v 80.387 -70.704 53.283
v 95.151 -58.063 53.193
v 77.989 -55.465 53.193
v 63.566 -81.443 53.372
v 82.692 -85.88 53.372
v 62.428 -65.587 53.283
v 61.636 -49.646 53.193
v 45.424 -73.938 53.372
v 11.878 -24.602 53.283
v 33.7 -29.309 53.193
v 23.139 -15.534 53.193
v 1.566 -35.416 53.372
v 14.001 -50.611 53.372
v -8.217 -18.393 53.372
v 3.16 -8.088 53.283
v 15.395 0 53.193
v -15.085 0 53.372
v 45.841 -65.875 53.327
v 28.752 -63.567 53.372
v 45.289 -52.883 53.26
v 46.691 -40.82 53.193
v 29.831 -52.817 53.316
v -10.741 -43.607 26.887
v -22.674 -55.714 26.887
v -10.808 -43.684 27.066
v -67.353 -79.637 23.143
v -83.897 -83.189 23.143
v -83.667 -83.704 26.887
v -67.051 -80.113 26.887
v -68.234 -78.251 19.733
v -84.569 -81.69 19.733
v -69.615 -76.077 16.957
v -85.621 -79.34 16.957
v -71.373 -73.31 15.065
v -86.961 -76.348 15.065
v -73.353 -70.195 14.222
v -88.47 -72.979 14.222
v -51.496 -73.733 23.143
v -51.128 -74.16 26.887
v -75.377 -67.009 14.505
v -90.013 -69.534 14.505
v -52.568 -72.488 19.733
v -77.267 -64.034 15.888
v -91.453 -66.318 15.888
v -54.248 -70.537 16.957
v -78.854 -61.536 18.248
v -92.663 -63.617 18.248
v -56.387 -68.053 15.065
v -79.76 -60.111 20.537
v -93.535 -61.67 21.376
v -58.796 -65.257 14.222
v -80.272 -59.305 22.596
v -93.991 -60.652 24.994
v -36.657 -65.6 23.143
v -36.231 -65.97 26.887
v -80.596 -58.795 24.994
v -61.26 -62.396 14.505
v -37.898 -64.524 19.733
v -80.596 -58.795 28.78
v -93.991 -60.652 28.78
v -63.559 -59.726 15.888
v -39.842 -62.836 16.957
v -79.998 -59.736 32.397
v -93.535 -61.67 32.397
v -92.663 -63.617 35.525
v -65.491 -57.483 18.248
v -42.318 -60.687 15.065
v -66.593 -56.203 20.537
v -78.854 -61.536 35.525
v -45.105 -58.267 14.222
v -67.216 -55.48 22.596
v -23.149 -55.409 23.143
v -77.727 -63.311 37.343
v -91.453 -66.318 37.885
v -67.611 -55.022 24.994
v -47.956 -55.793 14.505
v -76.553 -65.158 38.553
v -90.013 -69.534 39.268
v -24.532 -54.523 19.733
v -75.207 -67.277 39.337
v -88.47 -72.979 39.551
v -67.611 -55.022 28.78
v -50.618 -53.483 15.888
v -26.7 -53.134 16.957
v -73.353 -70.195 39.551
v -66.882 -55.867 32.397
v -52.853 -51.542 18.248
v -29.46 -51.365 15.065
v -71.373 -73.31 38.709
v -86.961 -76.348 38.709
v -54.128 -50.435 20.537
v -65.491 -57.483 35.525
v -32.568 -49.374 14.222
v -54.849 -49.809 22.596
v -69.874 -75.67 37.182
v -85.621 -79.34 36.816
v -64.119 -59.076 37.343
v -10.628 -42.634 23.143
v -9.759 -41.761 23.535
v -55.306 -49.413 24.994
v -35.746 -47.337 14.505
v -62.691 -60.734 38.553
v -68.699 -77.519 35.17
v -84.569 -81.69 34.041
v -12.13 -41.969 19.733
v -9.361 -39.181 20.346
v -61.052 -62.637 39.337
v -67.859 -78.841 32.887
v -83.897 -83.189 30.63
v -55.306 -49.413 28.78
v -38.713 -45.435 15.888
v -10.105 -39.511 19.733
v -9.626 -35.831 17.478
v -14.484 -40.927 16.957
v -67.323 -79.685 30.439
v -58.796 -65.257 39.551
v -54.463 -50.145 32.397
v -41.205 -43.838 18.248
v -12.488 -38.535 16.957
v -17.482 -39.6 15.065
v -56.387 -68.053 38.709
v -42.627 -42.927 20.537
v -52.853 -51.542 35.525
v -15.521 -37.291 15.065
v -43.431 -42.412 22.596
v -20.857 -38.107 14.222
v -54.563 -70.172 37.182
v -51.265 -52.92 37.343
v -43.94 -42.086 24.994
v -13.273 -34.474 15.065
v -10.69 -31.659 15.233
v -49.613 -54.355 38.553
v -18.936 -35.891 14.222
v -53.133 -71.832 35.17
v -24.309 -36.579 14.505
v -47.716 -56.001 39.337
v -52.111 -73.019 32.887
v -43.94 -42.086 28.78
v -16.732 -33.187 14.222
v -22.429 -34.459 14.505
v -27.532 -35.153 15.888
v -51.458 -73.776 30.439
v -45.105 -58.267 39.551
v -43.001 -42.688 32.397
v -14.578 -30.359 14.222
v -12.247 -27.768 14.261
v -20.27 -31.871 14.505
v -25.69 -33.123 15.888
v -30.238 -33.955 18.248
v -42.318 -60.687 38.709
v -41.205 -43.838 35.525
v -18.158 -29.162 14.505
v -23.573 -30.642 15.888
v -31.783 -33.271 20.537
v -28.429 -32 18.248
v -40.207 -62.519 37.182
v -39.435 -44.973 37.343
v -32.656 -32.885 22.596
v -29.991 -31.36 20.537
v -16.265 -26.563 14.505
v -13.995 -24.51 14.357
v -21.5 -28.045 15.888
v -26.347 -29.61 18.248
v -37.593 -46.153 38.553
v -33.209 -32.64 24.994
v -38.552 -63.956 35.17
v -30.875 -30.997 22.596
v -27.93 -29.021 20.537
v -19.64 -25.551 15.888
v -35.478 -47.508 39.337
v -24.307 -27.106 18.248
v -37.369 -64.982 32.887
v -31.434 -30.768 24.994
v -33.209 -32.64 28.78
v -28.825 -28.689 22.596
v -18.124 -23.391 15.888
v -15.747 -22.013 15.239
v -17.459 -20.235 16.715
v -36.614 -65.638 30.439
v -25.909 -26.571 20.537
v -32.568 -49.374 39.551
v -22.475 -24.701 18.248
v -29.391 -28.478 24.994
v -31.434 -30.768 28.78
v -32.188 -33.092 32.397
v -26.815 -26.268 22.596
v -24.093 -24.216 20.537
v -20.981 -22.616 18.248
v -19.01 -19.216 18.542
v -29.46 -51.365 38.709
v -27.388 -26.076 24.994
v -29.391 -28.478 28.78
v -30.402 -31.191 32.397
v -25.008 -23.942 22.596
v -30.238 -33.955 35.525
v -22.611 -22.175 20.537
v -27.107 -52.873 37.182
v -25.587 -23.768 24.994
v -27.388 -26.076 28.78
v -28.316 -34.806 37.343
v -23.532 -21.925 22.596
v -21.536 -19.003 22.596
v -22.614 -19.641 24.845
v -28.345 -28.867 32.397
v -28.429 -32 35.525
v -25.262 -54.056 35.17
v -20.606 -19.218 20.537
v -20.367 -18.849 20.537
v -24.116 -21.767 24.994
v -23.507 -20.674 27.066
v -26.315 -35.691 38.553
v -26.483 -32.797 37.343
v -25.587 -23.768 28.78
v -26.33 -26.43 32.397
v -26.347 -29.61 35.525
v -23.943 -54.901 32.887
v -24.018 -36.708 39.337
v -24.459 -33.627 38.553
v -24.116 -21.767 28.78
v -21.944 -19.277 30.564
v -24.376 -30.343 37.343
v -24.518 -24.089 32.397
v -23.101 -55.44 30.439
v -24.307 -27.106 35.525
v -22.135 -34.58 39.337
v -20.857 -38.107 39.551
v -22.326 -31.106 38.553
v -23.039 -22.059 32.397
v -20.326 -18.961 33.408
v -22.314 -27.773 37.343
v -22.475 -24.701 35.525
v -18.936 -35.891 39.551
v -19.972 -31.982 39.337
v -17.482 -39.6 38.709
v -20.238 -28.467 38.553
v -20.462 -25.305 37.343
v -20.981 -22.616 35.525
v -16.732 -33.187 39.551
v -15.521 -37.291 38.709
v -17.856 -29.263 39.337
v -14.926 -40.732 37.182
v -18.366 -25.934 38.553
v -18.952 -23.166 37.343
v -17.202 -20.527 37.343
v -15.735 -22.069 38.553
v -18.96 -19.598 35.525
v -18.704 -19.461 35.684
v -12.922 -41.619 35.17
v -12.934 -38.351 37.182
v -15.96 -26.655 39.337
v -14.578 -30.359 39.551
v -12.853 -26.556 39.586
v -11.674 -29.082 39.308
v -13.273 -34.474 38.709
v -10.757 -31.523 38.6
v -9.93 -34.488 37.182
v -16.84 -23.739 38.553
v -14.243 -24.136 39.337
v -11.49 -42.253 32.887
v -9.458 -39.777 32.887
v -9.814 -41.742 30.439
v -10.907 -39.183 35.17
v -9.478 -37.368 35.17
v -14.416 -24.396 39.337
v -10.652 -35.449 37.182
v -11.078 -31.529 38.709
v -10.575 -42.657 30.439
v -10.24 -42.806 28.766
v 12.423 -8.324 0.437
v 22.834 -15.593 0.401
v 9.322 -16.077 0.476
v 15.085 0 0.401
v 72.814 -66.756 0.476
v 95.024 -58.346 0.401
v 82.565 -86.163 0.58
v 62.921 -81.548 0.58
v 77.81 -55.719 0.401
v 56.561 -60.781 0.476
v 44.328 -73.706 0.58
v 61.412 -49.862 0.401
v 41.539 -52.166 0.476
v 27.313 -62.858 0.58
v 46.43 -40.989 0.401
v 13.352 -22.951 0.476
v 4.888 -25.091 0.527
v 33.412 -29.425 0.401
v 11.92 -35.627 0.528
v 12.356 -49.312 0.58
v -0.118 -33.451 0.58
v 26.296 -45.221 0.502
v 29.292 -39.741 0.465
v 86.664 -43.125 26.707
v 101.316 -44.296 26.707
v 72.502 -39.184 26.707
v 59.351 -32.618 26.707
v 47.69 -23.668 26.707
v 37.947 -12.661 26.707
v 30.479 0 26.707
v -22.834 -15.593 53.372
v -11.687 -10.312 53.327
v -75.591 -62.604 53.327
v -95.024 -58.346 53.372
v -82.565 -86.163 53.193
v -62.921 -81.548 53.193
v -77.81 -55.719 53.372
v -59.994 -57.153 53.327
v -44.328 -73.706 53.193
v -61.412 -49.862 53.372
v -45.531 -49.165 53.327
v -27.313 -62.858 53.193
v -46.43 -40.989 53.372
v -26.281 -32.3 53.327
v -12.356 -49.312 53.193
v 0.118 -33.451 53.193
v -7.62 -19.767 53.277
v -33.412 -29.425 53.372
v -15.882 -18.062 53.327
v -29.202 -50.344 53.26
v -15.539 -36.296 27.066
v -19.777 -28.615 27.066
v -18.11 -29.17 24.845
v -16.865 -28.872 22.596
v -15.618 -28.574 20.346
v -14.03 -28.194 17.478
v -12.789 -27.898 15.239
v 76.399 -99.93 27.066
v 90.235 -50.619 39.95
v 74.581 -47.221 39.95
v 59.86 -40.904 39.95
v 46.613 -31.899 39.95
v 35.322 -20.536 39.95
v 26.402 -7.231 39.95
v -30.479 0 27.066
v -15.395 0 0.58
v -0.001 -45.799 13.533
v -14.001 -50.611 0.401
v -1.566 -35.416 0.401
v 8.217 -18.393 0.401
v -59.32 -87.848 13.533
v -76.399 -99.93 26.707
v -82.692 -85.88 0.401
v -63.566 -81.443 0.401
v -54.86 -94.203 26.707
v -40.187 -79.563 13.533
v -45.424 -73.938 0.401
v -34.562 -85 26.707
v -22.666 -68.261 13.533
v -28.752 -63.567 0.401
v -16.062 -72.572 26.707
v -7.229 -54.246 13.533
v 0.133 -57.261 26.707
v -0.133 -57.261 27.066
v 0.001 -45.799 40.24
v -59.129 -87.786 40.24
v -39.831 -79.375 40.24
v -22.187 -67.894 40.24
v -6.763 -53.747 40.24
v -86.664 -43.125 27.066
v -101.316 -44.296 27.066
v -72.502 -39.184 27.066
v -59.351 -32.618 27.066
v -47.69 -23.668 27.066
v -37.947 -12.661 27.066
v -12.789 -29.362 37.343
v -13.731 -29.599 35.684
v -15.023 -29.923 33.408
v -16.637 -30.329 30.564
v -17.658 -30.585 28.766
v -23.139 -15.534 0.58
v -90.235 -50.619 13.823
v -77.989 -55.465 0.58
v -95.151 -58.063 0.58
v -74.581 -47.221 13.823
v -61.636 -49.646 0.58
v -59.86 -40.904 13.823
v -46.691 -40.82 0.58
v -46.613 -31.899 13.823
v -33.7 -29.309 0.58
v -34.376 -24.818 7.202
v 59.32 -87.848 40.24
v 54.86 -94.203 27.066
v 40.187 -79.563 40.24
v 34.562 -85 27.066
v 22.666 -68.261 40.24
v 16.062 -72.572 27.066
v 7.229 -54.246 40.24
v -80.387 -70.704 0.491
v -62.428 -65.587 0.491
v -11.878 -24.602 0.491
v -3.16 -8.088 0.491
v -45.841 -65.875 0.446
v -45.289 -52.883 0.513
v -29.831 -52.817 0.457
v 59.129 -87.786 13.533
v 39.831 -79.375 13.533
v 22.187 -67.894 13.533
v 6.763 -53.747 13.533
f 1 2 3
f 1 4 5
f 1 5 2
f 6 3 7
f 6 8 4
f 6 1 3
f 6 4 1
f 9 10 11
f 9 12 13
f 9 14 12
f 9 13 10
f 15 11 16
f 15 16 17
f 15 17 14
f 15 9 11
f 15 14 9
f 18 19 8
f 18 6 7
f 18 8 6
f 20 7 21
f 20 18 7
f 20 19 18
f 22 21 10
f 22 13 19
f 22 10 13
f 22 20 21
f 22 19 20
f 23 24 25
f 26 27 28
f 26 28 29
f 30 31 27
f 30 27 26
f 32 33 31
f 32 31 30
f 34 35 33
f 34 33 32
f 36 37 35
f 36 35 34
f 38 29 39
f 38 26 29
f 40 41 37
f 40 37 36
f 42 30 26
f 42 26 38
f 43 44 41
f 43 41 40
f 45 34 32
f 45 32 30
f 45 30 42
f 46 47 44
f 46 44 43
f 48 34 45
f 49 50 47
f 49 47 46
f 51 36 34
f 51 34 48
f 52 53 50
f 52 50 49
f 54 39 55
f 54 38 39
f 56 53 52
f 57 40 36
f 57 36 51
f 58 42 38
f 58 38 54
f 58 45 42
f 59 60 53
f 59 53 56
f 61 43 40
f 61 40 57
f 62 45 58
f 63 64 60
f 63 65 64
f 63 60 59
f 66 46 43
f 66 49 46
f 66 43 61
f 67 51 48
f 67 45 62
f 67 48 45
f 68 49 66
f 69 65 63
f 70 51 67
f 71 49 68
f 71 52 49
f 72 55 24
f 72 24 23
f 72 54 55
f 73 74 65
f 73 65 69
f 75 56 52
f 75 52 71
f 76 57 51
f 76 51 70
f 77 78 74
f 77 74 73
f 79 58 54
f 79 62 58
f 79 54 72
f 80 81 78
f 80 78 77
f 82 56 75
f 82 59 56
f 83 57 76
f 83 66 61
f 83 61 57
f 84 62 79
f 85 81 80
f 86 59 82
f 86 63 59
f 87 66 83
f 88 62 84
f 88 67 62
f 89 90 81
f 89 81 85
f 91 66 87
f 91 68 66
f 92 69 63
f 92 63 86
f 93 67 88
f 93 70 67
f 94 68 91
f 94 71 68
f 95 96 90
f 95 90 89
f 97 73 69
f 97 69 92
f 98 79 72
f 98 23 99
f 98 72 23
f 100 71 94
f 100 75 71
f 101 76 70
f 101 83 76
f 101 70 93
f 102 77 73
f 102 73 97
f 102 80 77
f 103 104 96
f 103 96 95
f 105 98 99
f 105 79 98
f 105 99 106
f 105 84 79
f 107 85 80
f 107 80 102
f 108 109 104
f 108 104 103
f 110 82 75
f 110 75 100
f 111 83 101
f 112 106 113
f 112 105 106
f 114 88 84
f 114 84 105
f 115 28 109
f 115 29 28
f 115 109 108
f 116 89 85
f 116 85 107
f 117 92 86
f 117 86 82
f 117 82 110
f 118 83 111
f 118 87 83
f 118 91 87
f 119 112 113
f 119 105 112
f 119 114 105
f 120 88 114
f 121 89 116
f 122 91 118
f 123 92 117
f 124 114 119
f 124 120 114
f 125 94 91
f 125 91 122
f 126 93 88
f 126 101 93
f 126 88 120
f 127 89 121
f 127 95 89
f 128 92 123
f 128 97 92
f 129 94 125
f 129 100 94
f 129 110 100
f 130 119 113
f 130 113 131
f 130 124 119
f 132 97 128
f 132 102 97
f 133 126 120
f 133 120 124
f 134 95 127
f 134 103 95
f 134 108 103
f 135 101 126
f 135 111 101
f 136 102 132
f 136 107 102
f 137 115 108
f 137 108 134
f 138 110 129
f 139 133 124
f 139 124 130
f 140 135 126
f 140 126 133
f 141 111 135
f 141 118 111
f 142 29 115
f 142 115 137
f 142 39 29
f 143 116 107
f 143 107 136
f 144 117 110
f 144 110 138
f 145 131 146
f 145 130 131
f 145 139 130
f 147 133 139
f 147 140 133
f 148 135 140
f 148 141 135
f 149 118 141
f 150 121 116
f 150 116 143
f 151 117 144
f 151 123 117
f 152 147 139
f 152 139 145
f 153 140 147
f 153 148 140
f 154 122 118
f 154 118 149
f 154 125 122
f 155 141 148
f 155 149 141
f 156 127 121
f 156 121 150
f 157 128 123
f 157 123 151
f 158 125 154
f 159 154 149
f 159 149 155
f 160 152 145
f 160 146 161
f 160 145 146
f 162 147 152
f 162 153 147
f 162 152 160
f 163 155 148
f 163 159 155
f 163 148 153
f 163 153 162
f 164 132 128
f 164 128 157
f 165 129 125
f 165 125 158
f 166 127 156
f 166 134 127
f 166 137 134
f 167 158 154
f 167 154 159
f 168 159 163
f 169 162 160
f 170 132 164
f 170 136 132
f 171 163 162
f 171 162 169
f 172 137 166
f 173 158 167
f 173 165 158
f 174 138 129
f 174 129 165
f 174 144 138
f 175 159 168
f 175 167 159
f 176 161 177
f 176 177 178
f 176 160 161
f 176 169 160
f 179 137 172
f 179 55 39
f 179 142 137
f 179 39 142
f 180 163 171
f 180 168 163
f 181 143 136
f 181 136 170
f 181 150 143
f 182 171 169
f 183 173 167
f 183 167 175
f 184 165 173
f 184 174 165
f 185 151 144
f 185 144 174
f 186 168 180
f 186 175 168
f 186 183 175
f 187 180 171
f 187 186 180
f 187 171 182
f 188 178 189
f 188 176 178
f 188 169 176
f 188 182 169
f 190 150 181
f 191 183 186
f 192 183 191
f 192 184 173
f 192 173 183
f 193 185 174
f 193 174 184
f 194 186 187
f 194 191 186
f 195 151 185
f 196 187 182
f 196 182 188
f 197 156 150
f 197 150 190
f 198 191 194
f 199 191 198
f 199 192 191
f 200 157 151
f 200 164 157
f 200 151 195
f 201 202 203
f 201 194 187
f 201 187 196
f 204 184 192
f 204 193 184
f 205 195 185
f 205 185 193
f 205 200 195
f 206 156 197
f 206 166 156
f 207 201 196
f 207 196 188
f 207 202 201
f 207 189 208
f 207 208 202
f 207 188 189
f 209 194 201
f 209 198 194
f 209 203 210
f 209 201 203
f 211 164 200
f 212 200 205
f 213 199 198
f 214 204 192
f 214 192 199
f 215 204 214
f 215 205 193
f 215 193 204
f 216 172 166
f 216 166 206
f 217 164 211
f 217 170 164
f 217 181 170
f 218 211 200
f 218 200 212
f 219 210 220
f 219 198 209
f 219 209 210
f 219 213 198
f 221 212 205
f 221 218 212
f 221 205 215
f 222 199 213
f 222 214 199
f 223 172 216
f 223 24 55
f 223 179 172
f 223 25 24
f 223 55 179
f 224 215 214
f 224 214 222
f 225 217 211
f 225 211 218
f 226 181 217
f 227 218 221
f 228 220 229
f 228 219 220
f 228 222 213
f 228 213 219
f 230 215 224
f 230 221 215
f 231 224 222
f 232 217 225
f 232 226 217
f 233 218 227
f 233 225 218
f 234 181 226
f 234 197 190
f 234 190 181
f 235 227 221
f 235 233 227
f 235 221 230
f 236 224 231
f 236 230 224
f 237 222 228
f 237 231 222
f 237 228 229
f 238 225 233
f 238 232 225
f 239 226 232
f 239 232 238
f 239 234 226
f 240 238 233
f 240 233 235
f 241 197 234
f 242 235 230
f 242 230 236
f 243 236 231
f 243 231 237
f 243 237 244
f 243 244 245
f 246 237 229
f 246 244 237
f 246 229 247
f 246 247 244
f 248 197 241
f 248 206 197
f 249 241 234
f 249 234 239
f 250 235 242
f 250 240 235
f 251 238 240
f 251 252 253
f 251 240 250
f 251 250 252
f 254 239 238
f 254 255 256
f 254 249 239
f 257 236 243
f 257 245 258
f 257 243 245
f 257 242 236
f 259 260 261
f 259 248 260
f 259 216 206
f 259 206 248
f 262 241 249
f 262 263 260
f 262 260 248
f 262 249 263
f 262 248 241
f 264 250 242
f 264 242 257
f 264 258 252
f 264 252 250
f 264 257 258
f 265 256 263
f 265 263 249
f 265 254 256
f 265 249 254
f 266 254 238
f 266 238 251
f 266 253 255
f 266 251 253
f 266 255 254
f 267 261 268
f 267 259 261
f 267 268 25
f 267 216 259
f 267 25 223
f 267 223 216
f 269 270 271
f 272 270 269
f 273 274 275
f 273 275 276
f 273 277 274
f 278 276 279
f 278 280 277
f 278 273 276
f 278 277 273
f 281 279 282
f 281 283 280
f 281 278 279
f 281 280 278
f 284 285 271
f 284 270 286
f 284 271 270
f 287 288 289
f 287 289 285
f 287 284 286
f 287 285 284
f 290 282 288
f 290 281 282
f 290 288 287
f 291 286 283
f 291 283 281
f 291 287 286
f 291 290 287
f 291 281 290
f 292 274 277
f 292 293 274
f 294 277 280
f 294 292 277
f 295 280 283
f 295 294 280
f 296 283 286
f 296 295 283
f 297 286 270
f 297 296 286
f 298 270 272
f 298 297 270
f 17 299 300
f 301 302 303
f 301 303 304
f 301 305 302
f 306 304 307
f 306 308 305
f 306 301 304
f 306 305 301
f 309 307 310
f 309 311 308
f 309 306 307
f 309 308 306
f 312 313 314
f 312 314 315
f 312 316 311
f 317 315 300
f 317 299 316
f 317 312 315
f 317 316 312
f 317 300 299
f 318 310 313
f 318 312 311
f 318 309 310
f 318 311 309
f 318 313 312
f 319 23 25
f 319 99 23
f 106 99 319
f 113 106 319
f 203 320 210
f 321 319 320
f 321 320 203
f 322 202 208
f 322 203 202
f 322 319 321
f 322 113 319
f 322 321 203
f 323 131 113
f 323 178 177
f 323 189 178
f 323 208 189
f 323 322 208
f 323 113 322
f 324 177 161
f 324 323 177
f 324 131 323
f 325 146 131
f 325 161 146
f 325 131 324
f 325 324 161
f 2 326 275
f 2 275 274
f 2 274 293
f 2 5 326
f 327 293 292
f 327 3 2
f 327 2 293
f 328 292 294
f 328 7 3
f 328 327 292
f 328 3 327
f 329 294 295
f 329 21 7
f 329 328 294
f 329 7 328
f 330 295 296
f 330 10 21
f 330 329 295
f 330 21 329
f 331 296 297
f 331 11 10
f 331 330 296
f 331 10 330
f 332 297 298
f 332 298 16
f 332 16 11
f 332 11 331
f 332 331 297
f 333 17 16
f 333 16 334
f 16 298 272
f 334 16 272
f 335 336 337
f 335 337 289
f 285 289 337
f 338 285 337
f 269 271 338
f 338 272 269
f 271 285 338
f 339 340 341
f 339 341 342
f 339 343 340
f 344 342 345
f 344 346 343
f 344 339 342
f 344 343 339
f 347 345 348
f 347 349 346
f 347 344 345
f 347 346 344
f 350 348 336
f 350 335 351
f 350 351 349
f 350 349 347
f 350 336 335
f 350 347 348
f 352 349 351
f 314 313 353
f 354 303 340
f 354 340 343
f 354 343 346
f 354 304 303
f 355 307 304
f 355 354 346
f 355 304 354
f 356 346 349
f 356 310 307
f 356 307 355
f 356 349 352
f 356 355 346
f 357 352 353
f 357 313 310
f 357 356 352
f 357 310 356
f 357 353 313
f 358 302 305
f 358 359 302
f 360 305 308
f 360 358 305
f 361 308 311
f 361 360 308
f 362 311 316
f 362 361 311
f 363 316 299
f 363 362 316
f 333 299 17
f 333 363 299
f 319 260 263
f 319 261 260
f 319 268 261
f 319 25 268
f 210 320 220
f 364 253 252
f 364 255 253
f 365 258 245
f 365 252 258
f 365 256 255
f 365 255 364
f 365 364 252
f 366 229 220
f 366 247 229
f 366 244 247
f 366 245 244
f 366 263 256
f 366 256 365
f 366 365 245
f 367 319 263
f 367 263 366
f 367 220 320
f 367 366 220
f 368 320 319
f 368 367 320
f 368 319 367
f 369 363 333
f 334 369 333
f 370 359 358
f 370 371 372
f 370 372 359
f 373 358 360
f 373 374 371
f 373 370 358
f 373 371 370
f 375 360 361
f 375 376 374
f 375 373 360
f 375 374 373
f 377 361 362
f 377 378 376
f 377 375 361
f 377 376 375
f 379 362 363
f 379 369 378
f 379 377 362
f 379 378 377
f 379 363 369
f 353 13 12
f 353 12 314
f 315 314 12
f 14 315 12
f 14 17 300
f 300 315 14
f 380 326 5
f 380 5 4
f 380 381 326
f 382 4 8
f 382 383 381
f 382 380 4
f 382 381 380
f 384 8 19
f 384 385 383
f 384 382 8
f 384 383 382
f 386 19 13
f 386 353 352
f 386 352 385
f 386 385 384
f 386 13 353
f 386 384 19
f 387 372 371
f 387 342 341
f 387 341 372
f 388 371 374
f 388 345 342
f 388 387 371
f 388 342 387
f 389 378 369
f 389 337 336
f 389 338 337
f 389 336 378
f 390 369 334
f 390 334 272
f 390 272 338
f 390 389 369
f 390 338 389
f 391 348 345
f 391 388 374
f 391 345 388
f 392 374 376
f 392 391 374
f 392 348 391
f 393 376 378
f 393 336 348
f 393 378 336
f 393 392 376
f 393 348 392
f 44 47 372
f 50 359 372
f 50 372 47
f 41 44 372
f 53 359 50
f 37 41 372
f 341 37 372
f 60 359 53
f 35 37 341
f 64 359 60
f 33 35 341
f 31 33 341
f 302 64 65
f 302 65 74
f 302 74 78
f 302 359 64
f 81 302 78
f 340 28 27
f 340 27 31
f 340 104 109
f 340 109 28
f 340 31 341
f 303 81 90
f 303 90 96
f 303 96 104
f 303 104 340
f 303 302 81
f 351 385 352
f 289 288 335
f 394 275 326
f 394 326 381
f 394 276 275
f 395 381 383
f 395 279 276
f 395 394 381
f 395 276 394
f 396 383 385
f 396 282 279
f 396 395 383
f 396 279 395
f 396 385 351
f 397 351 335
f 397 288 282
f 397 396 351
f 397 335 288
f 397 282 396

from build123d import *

# Parameters (mm, degrees)
F0_R = 12.7


with BuildPart() as f2:
    # F2: sweep along a path in F1
    with BuildLine(Plane.XY) as f2_path:
        ThreePointArc((-88.857807219, -72.1131786704), (-33.770108767, -49.1903487224), (0, 0))
    # F0 (on Front) → F2 (sweep)
    with BuildSketch(Plane.XZ):
        Polygon((-30.4794730405, 27.0658959038), (-15.3949537232, 0.5802832628), (15.0845193173, 0.401053875), (30.4794730405, 26.7074371281), (15.3949537232, 53.193049769), (-15.0845193173, 53.3722791569), align=None)
        with Locations((0, 26.8866665159)):
            Circle(F0_R, mode=Mode.SUBTRACT)
    sweep(path=f2_path.line)

    # F3: sweep along a path in F1
    with BuildLine(Plane.XY) as f3_path:
        ThreePointArc((88.857807219, -72.1131786704), (33.770108767, -49.1903487224), (0, 0))
    # F0 (on Front) → F3 (sweep)
    with BuildSketch(Plane.XZ):
        Polygon((-30.4794730405, 27.0658959038), (-15.3949537232, 0.5802832628), (15.0845193173, 0.401053875), (30.4794730405, 26.7074371281), (15.3949537232, 53.193049769), (-15.0845193173, 53.3722791569), align=None)
        with Locations((0, 26.8866665159)):
            Circle(F0_R, mode=Mode.SUBTRACT)
        with Locations((0, 26.8866665159)):
            Circle(F0_R)
    sweep(path=f3_path.line)


solid = f2.part
